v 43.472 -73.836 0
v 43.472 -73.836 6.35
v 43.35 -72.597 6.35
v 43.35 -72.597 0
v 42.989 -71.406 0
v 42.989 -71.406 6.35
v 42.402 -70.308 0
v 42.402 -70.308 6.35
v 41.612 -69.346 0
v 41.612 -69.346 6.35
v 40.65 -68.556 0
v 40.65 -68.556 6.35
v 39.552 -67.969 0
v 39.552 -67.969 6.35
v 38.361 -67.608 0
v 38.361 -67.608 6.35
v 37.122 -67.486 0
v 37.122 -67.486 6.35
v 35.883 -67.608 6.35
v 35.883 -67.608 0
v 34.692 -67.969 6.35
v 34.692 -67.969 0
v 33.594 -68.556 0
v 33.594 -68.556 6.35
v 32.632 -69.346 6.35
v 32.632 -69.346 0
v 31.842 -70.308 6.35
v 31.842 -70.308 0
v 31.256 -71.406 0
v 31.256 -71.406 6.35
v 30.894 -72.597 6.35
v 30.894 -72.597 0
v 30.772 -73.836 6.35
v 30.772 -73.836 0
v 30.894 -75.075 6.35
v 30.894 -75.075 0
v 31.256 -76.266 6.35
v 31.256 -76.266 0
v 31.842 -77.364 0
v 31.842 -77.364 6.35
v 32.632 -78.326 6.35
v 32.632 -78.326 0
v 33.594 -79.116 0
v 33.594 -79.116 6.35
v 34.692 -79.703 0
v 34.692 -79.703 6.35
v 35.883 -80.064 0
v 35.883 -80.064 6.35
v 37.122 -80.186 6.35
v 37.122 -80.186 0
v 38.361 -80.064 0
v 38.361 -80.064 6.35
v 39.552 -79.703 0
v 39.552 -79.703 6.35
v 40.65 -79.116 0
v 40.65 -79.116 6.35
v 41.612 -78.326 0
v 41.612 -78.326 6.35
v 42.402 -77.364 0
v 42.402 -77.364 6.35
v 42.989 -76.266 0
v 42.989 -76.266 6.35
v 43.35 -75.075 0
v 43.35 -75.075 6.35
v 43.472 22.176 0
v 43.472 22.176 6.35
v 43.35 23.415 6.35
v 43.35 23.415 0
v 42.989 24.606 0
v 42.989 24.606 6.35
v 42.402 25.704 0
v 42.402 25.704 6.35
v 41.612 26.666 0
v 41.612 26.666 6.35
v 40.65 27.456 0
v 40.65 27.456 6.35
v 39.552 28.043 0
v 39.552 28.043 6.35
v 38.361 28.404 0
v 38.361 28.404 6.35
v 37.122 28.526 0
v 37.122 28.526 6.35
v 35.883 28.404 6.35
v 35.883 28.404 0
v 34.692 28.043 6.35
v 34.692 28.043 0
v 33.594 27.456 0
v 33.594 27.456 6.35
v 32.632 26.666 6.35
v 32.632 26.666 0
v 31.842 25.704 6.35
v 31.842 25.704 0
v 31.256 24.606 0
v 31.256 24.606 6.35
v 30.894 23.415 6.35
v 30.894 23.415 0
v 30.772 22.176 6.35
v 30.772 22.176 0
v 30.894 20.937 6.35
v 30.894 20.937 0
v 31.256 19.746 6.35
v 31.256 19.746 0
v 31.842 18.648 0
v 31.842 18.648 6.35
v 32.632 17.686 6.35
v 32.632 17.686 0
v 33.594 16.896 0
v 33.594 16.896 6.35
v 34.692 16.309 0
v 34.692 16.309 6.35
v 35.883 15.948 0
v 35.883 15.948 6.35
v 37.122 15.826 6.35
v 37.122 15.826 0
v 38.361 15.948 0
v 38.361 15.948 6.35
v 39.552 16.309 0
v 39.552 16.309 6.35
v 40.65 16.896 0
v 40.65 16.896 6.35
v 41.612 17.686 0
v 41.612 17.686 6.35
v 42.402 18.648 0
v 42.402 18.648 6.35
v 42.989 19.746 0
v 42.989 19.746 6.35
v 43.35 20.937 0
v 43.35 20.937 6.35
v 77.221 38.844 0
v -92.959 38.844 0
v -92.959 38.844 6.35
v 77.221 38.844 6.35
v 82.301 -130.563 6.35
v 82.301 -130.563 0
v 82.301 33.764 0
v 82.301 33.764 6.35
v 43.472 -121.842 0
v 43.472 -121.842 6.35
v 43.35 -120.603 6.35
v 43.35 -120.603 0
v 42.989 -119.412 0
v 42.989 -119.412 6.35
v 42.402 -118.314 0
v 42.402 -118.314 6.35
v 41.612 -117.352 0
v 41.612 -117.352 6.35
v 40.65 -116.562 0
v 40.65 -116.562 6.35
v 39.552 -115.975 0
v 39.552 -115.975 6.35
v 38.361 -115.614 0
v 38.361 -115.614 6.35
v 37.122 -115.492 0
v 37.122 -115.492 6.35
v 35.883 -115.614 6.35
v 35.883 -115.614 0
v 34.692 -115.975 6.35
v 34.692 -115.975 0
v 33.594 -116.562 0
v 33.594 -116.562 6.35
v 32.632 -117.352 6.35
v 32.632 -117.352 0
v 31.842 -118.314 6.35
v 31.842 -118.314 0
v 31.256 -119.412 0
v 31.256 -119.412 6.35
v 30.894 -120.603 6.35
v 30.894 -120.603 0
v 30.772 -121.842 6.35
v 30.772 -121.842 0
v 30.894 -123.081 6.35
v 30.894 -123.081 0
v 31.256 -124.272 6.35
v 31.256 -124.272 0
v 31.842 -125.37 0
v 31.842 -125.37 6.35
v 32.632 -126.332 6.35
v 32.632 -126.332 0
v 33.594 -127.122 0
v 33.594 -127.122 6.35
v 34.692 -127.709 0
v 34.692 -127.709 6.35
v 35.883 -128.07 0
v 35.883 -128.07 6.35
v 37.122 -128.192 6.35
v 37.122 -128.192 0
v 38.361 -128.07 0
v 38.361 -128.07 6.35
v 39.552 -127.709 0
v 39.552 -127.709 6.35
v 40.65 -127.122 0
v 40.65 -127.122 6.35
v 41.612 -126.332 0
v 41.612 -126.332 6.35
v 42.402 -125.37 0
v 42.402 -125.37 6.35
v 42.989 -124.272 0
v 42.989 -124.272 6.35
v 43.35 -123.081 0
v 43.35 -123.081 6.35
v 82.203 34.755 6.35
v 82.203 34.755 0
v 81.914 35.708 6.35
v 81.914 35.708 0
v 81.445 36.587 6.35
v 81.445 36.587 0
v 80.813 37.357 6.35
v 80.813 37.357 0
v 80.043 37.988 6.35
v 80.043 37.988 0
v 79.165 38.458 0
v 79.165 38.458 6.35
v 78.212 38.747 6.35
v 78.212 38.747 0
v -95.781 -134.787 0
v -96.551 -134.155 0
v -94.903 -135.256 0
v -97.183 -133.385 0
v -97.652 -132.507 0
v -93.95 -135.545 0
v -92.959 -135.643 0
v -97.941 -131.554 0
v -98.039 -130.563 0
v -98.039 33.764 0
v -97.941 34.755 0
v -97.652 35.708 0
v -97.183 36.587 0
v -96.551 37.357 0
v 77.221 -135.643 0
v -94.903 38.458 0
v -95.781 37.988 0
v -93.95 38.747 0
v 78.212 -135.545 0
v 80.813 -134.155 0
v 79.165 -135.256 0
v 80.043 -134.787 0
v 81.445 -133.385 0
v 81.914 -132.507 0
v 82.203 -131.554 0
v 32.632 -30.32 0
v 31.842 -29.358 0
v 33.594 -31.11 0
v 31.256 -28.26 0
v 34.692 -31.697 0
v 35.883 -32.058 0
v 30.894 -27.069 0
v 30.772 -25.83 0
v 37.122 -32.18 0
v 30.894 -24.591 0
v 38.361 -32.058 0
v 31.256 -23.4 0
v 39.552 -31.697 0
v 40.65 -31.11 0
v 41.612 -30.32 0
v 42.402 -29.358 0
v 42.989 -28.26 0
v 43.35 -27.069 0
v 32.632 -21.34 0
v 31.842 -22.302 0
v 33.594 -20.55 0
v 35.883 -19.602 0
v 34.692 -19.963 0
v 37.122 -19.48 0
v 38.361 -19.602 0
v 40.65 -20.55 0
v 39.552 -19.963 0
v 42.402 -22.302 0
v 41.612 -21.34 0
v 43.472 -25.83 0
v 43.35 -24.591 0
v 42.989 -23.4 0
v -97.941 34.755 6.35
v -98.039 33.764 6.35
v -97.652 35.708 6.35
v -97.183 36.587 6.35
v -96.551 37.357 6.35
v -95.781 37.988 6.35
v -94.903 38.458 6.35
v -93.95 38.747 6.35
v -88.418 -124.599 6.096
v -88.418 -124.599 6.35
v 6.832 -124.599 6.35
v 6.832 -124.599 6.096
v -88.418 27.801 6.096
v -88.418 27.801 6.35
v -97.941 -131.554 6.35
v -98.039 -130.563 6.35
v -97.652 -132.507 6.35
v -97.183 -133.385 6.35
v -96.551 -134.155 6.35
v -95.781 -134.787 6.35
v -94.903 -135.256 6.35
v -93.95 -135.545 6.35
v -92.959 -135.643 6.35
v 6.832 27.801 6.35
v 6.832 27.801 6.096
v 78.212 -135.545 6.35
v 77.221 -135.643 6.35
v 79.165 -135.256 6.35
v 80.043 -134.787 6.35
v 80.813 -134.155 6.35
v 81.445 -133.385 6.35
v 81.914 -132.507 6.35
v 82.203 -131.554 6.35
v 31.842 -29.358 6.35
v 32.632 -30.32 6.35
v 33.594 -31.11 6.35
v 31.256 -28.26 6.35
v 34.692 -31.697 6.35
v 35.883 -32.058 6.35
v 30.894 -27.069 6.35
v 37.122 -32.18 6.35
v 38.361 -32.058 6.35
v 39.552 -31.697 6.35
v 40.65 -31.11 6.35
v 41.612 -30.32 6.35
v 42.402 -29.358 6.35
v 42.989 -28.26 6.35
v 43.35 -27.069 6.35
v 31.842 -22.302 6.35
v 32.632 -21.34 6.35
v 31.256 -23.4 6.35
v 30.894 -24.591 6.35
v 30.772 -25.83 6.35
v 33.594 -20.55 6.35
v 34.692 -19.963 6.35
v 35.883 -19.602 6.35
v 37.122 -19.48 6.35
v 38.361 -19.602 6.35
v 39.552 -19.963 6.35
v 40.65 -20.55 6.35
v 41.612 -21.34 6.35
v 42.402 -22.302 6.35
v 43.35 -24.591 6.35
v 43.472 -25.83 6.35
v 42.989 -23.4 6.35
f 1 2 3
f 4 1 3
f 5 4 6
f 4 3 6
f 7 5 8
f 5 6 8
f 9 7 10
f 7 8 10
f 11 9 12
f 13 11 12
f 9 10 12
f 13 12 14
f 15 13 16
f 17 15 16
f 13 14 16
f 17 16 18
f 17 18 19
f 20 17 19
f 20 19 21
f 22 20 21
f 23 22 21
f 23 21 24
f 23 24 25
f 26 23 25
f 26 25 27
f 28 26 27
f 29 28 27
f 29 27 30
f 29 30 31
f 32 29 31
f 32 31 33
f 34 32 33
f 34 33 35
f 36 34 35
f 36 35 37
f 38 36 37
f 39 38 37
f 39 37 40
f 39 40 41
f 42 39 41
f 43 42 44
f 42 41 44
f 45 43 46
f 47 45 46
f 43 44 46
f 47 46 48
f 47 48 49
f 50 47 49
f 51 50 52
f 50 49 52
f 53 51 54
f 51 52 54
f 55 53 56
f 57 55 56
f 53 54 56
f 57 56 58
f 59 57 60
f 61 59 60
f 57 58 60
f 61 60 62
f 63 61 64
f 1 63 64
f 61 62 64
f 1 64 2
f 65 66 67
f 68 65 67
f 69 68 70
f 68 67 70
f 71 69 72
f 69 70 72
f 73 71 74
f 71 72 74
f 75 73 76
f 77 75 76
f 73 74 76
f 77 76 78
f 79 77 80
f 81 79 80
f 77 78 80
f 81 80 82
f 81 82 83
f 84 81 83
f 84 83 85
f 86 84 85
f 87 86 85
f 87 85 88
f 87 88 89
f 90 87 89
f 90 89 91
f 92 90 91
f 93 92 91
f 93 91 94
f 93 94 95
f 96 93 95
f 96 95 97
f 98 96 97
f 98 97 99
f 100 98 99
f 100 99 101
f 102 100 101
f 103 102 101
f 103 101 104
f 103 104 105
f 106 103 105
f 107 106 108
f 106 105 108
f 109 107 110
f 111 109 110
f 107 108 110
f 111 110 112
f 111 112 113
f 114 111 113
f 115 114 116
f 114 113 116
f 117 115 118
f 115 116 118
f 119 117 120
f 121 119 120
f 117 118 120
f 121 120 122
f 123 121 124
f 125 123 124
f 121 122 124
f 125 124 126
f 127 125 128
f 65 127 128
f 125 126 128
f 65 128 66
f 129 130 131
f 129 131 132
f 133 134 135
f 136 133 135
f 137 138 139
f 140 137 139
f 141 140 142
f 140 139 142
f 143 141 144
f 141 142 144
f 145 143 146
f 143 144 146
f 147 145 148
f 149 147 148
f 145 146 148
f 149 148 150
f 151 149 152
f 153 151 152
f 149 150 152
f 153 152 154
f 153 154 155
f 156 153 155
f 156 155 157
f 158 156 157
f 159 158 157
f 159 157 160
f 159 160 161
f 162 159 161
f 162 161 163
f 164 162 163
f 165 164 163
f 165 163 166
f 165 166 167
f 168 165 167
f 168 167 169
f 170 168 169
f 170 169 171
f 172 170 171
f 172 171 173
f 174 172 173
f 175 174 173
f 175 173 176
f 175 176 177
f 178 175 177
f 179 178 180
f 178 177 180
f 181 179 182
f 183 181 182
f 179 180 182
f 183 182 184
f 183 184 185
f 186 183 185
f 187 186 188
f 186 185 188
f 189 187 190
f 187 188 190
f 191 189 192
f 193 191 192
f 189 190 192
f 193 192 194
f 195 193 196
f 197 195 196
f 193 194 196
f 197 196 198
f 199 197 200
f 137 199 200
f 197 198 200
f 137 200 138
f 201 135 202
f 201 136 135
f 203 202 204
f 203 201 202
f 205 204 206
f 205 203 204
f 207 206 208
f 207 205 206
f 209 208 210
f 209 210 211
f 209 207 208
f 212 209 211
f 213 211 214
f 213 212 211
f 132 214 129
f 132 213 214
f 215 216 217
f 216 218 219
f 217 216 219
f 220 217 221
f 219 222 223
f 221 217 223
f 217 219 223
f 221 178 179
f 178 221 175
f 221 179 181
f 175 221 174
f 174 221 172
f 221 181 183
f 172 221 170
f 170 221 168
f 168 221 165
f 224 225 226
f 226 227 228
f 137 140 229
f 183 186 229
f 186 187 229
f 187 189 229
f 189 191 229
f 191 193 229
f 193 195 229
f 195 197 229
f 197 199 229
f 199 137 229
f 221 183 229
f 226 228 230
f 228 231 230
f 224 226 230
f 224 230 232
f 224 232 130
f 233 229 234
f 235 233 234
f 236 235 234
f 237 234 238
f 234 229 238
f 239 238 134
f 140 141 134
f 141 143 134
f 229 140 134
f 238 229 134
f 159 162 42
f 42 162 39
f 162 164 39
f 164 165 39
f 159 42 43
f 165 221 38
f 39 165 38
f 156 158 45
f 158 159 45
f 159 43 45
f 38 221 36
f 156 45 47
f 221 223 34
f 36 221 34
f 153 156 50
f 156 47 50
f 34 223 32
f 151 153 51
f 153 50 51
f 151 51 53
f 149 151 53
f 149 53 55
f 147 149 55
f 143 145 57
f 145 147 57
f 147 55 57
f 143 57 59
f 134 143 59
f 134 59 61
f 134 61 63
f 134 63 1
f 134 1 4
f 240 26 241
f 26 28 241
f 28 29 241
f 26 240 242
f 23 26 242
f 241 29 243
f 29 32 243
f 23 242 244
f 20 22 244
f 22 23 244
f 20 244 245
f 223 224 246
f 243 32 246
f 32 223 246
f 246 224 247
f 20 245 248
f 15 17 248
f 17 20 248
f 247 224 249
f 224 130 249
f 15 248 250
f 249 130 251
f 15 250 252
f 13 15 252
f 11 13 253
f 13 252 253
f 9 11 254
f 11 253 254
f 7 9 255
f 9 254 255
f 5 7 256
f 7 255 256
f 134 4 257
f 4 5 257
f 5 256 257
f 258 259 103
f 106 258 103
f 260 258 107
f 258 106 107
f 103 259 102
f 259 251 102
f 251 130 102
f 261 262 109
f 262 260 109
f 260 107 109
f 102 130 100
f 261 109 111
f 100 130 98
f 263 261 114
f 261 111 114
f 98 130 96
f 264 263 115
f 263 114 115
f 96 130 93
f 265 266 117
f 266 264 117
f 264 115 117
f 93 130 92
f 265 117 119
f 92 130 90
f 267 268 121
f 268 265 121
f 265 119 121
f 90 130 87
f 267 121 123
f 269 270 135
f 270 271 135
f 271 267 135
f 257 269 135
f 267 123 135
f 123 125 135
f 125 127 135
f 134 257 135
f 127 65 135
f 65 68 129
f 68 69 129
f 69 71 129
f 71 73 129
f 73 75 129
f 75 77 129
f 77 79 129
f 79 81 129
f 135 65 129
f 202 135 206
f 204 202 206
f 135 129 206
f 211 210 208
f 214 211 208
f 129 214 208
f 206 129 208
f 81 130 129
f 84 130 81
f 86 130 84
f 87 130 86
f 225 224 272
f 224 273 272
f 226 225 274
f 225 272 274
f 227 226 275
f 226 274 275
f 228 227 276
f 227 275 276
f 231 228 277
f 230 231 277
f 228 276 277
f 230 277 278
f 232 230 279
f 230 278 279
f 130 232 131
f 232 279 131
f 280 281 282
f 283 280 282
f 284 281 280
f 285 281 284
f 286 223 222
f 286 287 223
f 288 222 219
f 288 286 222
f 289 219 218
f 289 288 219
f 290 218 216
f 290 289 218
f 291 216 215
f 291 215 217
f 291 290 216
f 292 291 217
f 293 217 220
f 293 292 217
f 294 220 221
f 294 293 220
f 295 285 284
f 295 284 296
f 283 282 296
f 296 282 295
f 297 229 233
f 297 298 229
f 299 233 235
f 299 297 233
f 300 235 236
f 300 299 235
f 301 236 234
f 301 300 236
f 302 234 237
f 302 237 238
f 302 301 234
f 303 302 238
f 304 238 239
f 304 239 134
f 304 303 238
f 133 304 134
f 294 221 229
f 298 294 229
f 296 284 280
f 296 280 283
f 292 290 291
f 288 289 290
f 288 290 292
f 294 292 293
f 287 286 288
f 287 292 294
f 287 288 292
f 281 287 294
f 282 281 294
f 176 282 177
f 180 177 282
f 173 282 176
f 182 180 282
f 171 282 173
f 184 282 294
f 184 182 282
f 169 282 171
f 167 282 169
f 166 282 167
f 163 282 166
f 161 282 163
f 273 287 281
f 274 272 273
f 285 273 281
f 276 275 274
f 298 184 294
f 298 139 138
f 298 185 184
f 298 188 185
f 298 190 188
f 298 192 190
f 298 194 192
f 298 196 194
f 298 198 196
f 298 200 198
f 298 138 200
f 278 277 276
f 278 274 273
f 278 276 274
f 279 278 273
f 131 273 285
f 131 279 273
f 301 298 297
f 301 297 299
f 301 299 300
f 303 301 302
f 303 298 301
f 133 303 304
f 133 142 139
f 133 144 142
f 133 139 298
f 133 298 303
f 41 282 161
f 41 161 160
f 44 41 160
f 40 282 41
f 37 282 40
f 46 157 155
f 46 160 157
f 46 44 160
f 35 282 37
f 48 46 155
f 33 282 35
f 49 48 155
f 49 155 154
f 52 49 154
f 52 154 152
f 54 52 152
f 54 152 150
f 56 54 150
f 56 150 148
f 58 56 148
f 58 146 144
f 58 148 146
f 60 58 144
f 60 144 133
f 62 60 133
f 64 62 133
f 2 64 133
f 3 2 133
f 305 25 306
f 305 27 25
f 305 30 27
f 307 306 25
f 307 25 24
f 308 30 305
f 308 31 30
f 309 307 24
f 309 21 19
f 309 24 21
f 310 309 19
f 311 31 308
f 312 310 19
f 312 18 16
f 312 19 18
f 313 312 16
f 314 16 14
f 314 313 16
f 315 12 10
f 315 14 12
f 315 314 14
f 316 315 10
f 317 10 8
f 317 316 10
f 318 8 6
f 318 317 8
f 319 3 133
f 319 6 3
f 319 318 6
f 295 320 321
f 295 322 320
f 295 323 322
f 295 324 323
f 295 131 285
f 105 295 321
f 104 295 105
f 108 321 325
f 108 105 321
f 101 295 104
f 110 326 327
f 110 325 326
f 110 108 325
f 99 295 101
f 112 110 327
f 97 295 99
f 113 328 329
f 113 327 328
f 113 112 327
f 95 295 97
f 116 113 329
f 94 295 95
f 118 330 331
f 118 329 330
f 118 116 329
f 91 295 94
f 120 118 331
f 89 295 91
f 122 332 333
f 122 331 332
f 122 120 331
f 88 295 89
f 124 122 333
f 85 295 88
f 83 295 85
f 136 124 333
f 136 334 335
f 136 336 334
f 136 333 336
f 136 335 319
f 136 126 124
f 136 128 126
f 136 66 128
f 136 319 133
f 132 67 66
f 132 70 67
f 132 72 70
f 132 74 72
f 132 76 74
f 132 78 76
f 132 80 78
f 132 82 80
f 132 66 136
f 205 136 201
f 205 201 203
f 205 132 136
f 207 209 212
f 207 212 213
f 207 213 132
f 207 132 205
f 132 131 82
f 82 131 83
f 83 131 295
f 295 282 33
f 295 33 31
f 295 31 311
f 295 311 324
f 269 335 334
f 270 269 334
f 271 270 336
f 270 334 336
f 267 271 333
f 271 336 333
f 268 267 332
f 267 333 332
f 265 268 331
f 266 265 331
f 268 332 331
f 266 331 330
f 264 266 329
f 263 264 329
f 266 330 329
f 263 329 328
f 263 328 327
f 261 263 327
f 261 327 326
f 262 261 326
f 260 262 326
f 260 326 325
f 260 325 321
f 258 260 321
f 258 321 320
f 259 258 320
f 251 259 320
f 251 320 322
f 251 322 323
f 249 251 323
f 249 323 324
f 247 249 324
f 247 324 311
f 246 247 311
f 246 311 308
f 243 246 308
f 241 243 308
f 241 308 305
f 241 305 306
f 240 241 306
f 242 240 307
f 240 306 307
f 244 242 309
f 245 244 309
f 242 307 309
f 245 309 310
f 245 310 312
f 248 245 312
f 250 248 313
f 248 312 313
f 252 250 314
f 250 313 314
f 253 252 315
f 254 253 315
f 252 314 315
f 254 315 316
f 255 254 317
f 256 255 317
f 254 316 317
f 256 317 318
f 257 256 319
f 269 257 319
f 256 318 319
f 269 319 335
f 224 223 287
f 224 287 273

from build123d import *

# Parameters (mm, degrees)
F0_W     = 180.34
F0_H     = 174.487158
F1_DEPTH = 6.35
F2_R     = 5.08
F3_W     = 95.25
F3_H     = 152.4
F4_DEPTH = 0.254
F3_R     = 6.35
F5_DEPTH = 25.4


with BuildPart() as f1:
    # F0 (on Top) → F1 (new body)
    with BuildSketch(Plane.XY):
        with Locations((-7.8691, -48.399139)):
            Rectangle(F0_W, F0_H)
    extrude(amount=F1_DEPTH)

    # F2
    f2_edges = [f1.edges().sort_by_distance(p)[0] for p in [
        (-98.0391, -135.642718, 3.175),
        (82.3009, -135.642718, 3.175),
        (-98.0391, 38.84444, 3.175),
        (82.3009, 38.84444, 3.175),
    ]]
    fillet(f2_edges, radius=F2_R)

    # F3 (on face) → F4 (cut)
    with BuildSketch(Plane.XY.offset(6.35)):
        with Locations((-40.792745, -48.399139)):
            Rectangle(F3_W, F3_H)
    extrude(amount=-F4_DEPTH, mode=Mode.SUBTRACT)

    # F3 (on face) → F5 (cut)
    with BuildSketch(Plane.XY.offset(6.35)):
        with Locations((37.122272, -121.842124)):
            Circle(F3_R)
        with Locations((37.122272, -73.836124)):
            Circle(F3_R)
        with Locations((37.122272, 22.175876)):
            Circle(F3_R)
        with Locations((37.122272, -25.830124)):
            Circle(F3_R)
    extrude(amount=-F5_DEPTH, mode=Mode.SUBTRACT)


solid = f1.part
